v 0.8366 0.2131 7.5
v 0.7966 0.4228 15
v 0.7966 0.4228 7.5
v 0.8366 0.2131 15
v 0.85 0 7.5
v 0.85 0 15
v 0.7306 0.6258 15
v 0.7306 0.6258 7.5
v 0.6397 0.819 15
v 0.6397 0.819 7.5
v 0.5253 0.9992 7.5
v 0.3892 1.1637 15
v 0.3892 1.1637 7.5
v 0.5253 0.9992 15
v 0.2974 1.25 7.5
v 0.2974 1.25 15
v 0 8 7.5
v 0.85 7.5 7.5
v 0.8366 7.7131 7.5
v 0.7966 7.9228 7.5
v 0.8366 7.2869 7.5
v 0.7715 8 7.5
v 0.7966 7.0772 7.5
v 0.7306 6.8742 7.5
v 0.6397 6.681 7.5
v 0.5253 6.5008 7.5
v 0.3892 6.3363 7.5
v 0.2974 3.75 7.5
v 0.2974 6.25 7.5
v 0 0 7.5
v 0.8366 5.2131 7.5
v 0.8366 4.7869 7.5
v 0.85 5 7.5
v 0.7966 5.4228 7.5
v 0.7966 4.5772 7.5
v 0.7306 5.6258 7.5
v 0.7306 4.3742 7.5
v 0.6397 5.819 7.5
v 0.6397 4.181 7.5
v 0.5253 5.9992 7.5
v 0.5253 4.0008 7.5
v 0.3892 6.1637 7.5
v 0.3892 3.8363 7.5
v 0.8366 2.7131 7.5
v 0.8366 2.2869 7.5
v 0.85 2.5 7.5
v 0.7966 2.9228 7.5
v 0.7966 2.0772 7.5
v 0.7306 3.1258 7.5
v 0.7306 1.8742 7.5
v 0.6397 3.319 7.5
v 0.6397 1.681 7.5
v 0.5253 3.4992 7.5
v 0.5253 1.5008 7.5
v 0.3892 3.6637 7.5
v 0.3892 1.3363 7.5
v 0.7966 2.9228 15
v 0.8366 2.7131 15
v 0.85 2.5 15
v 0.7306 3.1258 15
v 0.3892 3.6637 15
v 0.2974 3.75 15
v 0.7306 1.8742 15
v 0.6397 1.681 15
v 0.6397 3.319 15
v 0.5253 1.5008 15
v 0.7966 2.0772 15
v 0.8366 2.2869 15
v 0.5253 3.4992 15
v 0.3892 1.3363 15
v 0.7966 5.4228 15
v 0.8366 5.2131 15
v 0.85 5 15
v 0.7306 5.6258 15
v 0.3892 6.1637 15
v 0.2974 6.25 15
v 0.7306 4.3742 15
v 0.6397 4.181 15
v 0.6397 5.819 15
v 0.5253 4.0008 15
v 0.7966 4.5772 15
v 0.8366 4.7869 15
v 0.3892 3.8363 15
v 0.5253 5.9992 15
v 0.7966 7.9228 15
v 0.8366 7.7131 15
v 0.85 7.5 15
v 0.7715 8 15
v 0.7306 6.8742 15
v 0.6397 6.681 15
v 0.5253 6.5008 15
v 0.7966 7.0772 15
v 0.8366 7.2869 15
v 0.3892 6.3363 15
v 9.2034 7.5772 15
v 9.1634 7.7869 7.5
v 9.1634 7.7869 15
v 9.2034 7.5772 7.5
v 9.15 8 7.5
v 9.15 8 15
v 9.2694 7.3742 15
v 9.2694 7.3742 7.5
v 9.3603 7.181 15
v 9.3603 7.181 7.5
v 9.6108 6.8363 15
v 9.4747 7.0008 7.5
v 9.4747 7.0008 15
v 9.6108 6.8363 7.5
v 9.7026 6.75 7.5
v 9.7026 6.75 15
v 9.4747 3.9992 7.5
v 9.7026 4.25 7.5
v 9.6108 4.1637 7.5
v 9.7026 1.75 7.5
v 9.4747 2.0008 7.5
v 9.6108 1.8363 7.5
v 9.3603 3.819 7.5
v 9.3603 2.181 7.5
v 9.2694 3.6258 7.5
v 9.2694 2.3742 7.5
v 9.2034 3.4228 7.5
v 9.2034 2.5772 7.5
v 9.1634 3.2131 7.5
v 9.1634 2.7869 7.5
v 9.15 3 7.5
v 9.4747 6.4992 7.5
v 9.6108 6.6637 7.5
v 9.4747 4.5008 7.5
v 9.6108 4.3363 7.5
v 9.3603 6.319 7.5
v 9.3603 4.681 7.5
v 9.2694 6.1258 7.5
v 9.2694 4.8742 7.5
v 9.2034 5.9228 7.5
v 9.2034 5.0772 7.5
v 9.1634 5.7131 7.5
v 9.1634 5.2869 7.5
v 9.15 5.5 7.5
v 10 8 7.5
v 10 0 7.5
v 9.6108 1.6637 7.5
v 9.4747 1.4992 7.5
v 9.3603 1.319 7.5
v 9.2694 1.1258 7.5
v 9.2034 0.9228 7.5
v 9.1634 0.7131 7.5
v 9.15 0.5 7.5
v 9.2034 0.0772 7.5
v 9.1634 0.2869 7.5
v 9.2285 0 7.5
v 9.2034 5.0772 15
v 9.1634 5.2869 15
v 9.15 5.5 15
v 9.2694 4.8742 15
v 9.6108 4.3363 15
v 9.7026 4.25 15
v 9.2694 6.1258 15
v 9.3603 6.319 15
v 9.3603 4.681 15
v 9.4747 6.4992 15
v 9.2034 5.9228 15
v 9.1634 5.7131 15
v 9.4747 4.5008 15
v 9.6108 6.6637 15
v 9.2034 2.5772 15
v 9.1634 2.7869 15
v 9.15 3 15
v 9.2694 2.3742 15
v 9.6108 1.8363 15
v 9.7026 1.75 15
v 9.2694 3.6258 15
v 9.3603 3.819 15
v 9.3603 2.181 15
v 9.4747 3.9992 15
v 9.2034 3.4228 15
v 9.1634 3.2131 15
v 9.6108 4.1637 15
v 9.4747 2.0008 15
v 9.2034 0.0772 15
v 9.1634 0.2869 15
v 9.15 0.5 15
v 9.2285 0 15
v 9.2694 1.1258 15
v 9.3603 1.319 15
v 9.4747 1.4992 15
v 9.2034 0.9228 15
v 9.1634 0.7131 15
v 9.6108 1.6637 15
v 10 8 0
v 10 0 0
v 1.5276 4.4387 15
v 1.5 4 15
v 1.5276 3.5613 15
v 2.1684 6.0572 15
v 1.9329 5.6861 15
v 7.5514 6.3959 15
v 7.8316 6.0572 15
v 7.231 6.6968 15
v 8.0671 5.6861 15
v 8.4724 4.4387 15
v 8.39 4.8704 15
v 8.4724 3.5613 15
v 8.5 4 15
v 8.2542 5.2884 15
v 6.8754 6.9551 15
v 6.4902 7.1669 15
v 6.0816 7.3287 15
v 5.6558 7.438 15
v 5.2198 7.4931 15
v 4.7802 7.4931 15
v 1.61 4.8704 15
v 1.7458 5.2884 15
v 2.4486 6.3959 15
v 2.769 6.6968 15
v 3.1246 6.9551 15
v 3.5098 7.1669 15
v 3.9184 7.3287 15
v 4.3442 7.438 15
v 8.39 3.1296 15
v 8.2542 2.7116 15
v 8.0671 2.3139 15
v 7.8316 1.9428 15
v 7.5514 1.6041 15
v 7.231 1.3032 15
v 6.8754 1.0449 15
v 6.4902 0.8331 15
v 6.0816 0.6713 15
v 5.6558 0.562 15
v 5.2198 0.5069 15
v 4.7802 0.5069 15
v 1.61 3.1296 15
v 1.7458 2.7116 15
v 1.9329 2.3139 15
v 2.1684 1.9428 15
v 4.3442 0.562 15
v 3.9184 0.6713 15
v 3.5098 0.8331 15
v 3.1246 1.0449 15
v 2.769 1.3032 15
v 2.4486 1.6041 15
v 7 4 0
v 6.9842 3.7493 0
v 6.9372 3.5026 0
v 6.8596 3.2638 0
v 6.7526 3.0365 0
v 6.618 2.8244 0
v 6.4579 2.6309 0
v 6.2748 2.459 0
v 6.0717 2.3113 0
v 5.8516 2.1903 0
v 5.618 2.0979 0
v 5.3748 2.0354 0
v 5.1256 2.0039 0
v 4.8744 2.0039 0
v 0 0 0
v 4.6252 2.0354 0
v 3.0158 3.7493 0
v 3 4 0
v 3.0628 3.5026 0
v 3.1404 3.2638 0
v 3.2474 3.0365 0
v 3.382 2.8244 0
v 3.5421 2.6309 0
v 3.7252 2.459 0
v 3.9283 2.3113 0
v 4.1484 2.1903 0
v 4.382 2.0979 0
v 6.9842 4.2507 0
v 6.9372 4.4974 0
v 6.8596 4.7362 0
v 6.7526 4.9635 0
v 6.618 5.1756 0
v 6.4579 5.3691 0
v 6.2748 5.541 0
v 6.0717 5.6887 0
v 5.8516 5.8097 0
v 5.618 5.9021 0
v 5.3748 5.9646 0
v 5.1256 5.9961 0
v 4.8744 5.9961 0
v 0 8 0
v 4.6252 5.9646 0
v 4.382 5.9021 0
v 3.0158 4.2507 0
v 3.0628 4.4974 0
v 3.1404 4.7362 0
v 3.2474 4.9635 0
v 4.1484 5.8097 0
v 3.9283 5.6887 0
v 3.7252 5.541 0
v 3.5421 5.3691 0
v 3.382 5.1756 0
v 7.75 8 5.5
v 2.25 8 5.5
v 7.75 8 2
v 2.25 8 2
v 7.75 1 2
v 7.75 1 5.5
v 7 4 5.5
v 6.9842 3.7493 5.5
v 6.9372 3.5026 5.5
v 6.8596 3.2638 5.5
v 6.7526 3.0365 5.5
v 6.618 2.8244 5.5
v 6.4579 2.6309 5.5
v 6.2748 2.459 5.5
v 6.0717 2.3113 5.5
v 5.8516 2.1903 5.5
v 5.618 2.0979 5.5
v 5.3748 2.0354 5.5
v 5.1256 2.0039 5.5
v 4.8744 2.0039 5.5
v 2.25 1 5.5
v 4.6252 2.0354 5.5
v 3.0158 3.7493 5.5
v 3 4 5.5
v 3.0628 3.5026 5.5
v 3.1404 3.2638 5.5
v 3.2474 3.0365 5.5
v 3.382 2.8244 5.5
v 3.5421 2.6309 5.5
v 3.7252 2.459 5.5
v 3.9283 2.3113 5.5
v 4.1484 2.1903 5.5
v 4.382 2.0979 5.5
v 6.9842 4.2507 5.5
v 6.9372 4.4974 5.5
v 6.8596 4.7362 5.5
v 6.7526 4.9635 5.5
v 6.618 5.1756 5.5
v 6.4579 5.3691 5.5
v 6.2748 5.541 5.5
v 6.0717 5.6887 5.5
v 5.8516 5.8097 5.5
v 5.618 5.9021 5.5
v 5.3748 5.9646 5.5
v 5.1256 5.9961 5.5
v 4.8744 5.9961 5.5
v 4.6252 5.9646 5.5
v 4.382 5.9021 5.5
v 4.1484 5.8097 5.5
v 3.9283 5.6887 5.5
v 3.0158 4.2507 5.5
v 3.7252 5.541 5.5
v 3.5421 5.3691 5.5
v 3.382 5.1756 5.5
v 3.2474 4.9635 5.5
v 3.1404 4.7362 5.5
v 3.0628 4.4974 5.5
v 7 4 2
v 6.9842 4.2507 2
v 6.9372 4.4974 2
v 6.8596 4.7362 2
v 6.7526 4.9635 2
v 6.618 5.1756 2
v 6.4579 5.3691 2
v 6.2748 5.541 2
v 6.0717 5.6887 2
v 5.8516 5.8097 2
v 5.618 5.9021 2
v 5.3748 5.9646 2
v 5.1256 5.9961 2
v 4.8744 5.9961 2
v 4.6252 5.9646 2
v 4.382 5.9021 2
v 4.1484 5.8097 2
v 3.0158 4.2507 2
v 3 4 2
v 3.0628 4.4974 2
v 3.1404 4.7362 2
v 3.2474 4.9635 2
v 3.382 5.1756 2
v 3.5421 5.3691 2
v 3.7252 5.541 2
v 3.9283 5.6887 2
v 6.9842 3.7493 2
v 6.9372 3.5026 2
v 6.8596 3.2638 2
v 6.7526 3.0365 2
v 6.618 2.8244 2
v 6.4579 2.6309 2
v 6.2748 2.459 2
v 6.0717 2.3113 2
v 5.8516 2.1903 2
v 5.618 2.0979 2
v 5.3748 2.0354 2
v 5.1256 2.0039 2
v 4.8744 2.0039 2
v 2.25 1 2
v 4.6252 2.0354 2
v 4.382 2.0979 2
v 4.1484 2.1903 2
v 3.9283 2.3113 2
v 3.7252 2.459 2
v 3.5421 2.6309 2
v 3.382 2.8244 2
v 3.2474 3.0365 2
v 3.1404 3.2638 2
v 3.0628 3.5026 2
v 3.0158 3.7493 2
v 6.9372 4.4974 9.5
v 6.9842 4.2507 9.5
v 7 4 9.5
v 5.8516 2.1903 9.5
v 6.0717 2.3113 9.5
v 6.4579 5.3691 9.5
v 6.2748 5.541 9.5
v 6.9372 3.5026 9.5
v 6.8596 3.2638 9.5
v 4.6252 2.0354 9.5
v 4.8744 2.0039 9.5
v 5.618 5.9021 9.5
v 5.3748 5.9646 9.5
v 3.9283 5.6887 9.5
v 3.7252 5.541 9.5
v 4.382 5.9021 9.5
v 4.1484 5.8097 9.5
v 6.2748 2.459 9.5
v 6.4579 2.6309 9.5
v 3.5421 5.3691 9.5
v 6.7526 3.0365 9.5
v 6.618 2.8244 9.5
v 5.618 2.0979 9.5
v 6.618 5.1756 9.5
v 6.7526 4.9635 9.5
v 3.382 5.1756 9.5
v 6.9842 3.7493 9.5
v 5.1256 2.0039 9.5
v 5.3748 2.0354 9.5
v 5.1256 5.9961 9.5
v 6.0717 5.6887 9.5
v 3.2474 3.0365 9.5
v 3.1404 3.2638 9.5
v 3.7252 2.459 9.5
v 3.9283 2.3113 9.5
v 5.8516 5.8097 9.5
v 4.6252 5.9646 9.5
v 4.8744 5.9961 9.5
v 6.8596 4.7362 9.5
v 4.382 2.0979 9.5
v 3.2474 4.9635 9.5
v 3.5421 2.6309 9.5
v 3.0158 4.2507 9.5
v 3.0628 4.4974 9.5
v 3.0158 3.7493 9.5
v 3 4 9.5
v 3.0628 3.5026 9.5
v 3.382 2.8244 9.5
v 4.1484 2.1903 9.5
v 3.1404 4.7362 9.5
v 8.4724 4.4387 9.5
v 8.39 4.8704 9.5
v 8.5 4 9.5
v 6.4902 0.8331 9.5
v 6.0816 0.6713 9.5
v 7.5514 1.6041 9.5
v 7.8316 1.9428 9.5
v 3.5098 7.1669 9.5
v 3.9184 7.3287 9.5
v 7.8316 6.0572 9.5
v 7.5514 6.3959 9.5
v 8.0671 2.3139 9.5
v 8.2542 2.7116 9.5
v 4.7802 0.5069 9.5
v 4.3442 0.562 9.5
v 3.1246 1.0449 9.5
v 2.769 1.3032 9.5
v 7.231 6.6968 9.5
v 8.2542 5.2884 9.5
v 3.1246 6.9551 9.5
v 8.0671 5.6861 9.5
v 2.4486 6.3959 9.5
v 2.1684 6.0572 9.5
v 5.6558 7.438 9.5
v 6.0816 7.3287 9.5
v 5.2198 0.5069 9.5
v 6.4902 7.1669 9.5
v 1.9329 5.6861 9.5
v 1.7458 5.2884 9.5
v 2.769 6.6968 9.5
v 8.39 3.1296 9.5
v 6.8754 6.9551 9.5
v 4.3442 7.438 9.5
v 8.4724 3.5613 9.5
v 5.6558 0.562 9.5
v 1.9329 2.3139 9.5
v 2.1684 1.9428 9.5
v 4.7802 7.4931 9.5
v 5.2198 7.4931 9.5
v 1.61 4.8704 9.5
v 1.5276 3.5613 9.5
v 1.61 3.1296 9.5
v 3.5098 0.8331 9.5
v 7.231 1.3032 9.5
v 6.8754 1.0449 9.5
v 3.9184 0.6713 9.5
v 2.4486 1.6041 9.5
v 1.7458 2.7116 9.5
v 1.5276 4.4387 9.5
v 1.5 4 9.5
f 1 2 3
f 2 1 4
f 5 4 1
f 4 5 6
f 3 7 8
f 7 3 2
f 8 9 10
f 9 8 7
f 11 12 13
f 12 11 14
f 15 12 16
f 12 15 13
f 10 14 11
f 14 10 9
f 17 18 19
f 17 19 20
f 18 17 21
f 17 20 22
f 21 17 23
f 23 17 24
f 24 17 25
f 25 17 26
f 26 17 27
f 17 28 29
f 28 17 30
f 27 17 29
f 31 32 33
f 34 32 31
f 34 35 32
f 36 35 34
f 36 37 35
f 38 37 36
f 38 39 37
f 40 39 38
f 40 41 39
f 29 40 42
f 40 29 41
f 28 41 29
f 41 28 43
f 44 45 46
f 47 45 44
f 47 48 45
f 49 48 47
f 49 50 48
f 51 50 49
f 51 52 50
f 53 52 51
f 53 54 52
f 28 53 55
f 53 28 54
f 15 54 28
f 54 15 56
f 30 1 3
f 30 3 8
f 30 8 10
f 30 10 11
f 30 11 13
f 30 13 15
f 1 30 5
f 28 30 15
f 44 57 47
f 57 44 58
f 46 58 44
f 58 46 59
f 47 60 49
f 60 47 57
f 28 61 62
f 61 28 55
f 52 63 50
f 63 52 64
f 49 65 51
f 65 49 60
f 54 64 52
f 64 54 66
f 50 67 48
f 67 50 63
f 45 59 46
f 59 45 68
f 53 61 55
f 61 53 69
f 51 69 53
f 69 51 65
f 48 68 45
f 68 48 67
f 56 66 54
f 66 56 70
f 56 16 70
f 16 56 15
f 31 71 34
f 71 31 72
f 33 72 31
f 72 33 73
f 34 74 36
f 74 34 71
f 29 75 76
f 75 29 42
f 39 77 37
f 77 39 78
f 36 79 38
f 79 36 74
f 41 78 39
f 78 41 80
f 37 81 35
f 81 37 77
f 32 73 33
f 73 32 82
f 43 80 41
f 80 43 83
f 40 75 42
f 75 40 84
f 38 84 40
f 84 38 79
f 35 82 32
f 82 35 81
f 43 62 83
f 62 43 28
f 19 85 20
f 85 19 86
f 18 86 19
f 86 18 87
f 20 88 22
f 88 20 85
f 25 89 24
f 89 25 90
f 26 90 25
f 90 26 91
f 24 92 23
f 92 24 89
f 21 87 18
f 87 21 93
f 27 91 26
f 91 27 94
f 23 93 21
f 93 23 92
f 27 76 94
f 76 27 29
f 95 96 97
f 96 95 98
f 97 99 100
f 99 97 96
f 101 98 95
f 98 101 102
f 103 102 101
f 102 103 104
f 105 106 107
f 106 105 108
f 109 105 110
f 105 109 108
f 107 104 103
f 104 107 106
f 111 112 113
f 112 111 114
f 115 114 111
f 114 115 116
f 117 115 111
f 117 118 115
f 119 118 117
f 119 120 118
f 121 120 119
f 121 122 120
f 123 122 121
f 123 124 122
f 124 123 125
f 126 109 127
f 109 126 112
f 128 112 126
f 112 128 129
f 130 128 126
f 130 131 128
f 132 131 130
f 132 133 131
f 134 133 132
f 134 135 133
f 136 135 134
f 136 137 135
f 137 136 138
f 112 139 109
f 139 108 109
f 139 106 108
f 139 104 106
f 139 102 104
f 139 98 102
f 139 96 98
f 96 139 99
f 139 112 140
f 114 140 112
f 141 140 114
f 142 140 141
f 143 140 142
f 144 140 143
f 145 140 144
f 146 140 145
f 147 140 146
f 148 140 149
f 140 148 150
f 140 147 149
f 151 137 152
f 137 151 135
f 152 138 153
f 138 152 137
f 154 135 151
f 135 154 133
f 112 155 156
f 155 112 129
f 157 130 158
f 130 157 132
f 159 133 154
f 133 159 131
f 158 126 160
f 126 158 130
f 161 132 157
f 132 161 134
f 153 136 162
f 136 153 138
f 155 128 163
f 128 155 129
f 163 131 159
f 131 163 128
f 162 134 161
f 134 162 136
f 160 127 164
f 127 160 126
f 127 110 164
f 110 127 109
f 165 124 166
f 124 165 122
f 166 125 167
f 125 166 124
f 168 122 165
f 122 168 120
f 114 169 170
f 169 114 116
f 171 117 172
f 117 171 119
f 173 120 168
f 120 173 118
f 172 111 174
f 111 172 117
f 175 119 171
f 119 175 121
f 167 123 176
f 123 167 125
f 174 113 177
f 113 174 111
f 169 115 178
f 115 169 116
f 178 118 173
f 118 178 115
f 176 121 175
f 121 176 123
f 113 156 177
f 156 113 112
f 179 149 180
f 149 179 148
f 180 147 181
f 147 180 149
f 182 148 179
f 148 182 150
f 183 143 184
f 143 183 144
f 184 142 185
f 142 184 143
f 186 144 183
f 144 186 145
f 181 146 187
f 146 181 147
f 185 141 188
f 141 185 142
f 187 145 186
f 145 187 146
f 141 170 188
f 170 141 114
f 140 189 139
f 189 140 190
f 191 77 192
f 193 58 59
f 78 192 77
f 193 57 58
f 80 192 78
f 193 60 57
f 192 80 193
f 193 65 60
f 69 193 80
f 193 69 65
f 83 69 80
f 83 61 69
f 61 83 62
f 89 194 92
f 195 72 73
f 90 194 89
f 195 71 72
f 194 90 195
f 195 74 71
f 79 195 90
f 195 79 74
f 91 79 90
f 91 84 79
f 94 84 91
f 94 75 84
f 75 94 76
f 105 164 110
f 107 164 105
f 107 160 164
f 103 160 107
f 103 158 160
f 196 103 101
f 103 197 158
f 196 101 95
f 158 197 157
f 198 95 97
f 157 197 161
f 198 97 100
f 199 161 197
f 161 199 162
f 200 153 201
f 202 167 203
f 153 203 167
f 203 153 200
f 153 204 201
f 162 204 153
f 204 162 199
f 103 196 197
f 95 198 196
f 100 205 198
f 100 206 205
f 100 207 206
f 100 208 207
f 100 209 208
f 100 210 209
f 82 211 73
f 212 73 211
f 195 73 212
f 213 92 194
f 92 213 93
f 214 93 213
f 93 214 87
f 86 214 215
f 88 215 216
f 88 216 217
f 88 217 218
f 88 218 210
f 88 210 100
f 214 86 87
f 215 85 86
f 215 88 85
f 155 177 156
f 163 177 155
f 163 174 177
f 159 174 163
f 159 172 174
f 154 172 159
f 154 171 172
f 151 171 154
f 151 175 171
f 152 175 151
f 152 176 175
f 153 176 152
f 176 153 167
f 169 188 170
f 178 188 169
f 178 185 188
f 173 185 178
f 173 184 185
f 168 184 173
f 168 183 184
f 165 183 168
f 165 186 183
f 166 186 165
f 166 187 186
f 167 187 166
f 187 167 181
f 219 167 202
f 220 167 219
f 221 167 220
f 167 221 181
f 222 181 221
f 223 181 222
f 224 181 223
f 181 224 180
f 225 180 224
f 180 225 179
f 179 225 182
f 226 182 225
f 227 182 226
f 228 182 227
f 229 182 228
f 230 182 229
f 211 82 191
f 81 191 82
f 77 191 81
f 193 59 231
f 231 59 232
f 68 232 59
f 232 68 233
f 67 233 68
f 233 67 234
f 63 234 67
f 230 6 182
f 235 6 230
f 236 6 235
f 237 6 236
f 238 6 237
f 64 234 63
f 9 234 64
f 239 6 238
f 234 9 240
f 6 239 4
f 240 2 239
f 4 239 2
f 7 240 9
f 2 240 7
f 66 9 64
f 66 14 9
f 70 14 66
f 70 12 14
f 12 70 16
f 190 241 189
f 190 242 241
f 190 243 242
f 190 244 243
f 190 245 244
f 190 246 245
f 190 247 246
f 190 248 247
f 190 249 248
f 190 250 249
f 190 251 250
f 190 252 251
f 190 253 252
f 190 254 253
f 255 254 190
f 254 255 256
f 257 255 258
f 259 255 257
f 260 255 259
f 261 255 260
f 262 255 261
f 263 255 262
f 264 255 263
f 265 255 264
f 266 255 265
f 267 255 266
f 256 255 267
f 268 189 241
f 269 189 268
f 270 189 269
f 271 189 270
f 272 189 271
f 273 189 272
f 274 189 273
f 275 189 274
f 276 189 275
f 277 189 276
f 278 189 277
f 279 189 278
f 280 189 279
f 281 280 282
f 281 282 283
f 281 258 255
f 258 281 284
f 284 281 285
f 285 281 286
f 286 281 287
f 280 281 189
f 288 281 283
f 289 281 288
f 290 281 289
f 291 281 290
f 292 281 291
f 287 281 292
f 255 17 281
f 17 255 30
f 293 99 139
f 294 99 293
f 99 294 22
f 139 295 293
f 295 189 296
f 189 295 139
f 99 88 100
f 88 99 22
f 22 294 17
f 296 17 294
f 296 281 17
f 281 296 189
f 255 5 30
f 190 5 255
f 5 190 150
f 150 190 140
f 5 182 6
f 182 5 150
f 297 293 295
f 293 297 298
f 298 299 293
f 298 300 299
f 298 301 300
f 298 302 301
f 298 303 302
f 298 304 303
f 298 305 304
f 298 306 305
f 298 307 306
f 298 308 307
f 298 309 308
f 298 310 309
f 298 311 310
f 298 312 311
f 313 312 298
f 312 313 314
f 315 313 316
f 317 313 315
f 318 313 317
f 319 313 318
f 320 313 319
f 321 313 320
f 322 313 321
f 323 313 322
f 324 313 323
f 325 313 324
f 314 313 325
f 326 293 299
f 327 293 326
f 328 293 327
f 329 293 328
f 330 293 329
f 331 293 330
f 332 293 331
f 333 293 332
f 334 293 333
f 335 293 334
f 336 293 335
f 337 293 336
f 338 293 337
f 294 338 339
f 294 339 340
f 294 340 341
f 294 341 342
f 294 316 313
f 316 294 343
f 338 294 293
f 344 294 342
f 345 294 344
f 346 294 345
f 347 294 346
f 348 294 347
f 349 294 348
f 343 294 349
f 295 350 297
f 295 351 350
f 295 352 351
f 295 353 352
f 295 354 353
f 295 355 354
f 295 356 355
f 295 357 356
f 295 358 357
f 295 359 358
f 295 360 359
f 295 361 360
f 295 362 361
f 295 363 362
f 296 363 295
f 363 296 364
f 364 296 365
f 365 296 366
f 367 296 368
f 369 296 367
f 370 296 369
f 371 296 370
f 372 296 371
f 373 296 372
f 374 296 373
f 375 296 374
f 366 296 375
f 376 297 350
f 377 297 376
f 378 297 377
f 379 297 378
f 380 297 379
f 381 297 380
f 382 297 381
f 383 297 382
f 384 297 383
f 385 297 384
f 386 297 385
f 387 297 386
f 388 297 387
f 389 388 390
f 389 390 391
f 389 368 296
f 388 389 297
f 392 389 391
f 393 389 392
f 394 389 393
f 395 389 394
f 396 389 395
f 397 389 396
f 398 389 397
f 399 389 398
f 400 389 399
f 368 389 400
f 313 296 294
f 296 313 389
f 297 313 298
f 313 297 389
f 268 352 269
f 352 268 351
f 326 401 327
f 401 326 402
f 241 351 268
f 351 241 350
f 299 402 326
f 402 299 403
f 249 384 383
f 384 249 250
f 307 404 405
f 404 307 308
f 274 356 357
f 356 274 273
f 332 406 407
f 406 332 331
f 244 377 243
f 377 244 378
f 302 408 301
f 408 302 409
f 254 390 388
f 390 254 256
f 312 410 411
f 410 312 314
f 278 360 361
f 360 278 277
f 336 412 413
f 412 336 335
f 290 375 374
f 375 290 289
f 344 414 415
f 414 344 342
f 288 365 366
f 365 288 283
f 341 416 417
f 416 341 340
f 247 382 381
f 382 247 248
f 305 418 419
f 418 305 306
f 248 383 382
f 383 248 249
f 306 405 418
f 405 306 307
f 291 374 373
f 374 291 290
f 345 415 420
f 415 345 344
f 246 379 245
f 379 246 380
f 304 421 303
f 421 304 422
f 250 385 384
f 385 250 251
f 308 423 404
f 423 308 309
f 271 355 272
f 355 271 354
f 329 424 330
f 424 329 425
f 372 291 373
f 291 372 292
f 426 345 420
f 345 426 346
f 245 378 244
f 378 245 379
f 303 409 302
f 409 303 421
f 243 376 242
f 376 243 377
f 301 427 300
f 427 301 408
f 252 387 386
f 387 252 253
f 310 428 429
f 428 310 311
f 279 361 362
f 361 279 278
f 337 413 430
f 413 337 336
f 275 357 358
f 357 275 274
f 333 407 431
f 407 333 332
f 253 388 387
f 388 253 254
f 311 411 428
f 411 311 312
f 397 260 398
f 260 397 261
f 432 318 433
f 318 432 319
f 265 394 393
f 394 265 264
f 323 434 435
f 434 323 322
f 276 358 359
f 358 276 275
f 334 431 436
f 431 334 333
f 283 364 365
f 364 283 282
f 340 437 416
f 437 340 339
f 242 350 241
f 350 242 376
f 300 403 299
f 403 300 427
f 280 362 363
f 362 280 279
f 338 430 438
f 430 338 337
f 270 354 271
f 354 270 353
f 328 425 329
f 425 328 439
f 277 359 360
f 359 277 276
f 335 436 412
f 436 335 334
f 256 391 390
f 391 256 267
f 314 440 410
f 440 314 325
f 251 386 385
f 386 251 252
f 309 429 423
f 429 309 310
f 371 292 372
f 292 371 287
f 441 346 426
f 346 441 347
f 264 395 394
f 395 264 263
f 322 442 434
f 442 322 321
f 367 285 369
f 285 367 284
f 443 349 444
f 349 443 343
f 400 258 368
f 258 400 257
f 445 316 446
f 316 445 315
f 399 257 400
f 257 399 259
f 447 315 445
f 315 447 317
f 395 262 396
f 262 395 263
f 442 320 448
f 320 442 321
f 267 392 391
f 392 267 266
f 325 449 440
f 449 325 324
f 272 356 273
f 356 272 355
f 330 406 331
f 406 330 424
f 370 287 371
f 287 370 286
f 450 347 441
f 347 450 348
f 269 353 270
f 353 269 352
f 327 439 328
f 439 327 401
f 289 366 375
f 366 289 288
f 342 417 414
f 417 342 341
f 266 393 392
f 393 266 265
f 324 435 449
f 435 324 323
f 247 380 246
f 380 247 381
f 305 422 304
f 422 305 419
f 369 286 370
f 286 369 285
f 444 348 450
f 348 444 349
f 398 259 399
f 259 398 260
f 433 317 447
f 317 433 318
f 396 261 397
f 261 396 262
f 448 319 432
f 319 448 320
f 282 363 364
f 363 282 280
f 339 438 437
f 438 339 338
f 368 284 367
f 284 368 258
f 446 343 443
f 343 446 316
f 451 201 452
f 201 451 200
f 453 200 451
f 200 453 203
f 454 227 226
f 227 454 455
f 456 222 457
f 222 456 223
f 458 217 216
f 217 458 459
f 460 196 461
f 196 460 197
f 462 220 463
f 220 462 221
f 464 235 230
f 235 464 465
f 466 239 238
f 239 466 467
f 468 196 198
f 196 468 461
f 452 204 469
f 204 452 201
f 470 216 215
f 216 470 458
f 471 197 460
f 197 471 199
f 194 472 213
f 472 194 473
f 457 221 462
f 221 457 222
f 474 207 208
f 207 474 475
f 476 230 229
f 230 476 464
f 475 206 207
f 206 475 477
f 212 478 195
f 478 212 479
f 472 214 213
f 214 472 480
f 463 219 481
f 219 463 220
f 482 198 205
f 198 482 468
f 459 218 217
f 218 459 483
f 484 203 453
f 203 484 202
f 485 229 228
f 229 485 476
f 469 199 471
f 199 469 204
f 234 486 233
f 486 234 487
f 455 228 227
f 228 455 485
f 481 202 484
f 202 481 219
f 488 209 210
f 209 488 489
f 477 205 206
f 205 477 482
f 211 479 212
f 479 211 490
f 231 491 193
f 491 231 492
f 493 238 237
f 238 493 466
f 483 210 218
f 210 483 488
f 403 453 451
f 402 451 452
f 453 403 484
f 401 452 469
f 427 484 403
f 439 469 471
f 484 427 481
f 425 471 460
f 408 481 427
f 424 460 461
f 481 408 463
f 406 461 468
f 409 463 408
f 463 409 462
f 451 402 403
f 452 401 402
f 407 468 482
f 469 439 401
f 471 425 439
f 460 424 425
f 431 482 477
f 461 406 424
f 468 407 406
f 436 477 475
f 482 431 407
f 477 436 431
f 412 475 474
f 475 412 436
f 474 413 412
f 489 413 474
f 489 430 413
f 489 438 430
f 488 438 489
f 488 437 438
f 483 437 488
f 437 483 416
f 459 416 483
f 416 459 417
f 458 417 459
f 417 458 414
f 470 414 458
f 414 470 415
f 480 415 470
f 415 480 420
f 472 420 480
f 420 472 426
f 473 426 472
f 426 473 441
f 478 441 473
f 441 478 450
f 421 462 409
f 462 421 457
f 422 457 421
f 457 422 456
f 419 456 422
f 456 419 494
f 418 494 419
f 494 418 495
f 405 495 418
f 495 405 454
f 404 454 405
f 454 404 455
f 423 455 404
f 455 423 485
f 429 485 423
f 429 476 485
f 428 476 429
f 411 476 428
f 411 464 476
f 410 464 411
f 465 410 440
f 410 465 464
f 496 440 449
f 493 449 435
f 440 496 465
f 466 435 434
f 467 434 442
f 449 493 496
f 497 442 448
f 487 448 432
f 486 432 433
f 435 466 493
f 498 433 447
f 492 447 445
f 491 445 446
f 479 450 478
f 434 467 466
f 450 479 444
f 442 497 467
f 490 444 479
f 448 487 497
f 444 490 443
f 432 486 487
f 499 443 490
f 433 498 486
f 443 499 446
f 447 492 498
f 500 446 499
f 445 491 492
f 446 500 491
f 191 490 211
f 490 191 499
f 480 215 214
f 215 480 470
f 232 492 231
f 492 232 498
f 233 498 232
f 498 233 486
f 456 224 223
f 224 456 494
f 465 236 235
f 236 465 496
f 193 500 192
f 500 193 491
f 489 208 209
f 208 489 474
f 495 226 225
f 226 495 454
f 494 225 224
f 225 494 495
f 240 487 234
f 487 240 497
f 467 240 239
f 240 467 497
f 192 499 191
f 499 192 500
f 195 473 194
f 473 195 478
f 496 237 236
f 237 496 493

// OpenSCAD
// file: configure.scad
/*
 * file: configure.scad
 * author: gregor binder <gregor_reprap@catrix.at>
 * date: 16.11.2013
 * last change: 16.11.2013
 * license: CC BY-NC-SA 3.0
 */

nutsize=5.5;
nutdiagonale=6;
nutheight=3.5;
nutplaceholder=2;
screwdiameter=4;
screwheaddiameter=7;
rightdiameter=10;
rightheight=15;
leftheight=15;
leftthickness=8;
leftwidth=10;
gripradius=1.7;
$fn=50;
// main file
/*
 * file: box-closer-left.scad
 * author: gregor binder <gregor_reprap@catrix.at>
 * date: 16.11.2013
 * last change: 16.11.2013
 * license: CC BY-NC-SA 3.0
 */

include <configure.scad>

module grip() {
	count=5;
	translate([0,0,nutplaceholder+nutheight+nutplaceholder])
	for ( i = [0 : count-1] ) {
	translate([0, i*2.5, 0])
		cylinder(h=rightheight,r=gripradius);
	}
}

difference() {
	cube([leftwidth,leftthickness,leftheight]);
	translate([(leftwidth/2)-(nutsize/2),(leftthickness/2)-(nutdiagonale/2),nutplaceholder])
		cube([nutsize,leftthickness+10,nutheight]);
	translate([leftwidth/2,leftthickness/2,-1])
		cylinder(h=leftheight+5,r=screwdiameter/2);
	translate([leftwidth/2,leftthickness/2,nutplaceholder+nutsize+2])
		cylinder(h=10,r=screwheaddiameter/2);
	translate([-gripradius/2,0,0])
		grip();
	translate([leftwidth+(gripradius/2),leftthickness,0])
		rotate(	[0,0,180])
		grip();
}
